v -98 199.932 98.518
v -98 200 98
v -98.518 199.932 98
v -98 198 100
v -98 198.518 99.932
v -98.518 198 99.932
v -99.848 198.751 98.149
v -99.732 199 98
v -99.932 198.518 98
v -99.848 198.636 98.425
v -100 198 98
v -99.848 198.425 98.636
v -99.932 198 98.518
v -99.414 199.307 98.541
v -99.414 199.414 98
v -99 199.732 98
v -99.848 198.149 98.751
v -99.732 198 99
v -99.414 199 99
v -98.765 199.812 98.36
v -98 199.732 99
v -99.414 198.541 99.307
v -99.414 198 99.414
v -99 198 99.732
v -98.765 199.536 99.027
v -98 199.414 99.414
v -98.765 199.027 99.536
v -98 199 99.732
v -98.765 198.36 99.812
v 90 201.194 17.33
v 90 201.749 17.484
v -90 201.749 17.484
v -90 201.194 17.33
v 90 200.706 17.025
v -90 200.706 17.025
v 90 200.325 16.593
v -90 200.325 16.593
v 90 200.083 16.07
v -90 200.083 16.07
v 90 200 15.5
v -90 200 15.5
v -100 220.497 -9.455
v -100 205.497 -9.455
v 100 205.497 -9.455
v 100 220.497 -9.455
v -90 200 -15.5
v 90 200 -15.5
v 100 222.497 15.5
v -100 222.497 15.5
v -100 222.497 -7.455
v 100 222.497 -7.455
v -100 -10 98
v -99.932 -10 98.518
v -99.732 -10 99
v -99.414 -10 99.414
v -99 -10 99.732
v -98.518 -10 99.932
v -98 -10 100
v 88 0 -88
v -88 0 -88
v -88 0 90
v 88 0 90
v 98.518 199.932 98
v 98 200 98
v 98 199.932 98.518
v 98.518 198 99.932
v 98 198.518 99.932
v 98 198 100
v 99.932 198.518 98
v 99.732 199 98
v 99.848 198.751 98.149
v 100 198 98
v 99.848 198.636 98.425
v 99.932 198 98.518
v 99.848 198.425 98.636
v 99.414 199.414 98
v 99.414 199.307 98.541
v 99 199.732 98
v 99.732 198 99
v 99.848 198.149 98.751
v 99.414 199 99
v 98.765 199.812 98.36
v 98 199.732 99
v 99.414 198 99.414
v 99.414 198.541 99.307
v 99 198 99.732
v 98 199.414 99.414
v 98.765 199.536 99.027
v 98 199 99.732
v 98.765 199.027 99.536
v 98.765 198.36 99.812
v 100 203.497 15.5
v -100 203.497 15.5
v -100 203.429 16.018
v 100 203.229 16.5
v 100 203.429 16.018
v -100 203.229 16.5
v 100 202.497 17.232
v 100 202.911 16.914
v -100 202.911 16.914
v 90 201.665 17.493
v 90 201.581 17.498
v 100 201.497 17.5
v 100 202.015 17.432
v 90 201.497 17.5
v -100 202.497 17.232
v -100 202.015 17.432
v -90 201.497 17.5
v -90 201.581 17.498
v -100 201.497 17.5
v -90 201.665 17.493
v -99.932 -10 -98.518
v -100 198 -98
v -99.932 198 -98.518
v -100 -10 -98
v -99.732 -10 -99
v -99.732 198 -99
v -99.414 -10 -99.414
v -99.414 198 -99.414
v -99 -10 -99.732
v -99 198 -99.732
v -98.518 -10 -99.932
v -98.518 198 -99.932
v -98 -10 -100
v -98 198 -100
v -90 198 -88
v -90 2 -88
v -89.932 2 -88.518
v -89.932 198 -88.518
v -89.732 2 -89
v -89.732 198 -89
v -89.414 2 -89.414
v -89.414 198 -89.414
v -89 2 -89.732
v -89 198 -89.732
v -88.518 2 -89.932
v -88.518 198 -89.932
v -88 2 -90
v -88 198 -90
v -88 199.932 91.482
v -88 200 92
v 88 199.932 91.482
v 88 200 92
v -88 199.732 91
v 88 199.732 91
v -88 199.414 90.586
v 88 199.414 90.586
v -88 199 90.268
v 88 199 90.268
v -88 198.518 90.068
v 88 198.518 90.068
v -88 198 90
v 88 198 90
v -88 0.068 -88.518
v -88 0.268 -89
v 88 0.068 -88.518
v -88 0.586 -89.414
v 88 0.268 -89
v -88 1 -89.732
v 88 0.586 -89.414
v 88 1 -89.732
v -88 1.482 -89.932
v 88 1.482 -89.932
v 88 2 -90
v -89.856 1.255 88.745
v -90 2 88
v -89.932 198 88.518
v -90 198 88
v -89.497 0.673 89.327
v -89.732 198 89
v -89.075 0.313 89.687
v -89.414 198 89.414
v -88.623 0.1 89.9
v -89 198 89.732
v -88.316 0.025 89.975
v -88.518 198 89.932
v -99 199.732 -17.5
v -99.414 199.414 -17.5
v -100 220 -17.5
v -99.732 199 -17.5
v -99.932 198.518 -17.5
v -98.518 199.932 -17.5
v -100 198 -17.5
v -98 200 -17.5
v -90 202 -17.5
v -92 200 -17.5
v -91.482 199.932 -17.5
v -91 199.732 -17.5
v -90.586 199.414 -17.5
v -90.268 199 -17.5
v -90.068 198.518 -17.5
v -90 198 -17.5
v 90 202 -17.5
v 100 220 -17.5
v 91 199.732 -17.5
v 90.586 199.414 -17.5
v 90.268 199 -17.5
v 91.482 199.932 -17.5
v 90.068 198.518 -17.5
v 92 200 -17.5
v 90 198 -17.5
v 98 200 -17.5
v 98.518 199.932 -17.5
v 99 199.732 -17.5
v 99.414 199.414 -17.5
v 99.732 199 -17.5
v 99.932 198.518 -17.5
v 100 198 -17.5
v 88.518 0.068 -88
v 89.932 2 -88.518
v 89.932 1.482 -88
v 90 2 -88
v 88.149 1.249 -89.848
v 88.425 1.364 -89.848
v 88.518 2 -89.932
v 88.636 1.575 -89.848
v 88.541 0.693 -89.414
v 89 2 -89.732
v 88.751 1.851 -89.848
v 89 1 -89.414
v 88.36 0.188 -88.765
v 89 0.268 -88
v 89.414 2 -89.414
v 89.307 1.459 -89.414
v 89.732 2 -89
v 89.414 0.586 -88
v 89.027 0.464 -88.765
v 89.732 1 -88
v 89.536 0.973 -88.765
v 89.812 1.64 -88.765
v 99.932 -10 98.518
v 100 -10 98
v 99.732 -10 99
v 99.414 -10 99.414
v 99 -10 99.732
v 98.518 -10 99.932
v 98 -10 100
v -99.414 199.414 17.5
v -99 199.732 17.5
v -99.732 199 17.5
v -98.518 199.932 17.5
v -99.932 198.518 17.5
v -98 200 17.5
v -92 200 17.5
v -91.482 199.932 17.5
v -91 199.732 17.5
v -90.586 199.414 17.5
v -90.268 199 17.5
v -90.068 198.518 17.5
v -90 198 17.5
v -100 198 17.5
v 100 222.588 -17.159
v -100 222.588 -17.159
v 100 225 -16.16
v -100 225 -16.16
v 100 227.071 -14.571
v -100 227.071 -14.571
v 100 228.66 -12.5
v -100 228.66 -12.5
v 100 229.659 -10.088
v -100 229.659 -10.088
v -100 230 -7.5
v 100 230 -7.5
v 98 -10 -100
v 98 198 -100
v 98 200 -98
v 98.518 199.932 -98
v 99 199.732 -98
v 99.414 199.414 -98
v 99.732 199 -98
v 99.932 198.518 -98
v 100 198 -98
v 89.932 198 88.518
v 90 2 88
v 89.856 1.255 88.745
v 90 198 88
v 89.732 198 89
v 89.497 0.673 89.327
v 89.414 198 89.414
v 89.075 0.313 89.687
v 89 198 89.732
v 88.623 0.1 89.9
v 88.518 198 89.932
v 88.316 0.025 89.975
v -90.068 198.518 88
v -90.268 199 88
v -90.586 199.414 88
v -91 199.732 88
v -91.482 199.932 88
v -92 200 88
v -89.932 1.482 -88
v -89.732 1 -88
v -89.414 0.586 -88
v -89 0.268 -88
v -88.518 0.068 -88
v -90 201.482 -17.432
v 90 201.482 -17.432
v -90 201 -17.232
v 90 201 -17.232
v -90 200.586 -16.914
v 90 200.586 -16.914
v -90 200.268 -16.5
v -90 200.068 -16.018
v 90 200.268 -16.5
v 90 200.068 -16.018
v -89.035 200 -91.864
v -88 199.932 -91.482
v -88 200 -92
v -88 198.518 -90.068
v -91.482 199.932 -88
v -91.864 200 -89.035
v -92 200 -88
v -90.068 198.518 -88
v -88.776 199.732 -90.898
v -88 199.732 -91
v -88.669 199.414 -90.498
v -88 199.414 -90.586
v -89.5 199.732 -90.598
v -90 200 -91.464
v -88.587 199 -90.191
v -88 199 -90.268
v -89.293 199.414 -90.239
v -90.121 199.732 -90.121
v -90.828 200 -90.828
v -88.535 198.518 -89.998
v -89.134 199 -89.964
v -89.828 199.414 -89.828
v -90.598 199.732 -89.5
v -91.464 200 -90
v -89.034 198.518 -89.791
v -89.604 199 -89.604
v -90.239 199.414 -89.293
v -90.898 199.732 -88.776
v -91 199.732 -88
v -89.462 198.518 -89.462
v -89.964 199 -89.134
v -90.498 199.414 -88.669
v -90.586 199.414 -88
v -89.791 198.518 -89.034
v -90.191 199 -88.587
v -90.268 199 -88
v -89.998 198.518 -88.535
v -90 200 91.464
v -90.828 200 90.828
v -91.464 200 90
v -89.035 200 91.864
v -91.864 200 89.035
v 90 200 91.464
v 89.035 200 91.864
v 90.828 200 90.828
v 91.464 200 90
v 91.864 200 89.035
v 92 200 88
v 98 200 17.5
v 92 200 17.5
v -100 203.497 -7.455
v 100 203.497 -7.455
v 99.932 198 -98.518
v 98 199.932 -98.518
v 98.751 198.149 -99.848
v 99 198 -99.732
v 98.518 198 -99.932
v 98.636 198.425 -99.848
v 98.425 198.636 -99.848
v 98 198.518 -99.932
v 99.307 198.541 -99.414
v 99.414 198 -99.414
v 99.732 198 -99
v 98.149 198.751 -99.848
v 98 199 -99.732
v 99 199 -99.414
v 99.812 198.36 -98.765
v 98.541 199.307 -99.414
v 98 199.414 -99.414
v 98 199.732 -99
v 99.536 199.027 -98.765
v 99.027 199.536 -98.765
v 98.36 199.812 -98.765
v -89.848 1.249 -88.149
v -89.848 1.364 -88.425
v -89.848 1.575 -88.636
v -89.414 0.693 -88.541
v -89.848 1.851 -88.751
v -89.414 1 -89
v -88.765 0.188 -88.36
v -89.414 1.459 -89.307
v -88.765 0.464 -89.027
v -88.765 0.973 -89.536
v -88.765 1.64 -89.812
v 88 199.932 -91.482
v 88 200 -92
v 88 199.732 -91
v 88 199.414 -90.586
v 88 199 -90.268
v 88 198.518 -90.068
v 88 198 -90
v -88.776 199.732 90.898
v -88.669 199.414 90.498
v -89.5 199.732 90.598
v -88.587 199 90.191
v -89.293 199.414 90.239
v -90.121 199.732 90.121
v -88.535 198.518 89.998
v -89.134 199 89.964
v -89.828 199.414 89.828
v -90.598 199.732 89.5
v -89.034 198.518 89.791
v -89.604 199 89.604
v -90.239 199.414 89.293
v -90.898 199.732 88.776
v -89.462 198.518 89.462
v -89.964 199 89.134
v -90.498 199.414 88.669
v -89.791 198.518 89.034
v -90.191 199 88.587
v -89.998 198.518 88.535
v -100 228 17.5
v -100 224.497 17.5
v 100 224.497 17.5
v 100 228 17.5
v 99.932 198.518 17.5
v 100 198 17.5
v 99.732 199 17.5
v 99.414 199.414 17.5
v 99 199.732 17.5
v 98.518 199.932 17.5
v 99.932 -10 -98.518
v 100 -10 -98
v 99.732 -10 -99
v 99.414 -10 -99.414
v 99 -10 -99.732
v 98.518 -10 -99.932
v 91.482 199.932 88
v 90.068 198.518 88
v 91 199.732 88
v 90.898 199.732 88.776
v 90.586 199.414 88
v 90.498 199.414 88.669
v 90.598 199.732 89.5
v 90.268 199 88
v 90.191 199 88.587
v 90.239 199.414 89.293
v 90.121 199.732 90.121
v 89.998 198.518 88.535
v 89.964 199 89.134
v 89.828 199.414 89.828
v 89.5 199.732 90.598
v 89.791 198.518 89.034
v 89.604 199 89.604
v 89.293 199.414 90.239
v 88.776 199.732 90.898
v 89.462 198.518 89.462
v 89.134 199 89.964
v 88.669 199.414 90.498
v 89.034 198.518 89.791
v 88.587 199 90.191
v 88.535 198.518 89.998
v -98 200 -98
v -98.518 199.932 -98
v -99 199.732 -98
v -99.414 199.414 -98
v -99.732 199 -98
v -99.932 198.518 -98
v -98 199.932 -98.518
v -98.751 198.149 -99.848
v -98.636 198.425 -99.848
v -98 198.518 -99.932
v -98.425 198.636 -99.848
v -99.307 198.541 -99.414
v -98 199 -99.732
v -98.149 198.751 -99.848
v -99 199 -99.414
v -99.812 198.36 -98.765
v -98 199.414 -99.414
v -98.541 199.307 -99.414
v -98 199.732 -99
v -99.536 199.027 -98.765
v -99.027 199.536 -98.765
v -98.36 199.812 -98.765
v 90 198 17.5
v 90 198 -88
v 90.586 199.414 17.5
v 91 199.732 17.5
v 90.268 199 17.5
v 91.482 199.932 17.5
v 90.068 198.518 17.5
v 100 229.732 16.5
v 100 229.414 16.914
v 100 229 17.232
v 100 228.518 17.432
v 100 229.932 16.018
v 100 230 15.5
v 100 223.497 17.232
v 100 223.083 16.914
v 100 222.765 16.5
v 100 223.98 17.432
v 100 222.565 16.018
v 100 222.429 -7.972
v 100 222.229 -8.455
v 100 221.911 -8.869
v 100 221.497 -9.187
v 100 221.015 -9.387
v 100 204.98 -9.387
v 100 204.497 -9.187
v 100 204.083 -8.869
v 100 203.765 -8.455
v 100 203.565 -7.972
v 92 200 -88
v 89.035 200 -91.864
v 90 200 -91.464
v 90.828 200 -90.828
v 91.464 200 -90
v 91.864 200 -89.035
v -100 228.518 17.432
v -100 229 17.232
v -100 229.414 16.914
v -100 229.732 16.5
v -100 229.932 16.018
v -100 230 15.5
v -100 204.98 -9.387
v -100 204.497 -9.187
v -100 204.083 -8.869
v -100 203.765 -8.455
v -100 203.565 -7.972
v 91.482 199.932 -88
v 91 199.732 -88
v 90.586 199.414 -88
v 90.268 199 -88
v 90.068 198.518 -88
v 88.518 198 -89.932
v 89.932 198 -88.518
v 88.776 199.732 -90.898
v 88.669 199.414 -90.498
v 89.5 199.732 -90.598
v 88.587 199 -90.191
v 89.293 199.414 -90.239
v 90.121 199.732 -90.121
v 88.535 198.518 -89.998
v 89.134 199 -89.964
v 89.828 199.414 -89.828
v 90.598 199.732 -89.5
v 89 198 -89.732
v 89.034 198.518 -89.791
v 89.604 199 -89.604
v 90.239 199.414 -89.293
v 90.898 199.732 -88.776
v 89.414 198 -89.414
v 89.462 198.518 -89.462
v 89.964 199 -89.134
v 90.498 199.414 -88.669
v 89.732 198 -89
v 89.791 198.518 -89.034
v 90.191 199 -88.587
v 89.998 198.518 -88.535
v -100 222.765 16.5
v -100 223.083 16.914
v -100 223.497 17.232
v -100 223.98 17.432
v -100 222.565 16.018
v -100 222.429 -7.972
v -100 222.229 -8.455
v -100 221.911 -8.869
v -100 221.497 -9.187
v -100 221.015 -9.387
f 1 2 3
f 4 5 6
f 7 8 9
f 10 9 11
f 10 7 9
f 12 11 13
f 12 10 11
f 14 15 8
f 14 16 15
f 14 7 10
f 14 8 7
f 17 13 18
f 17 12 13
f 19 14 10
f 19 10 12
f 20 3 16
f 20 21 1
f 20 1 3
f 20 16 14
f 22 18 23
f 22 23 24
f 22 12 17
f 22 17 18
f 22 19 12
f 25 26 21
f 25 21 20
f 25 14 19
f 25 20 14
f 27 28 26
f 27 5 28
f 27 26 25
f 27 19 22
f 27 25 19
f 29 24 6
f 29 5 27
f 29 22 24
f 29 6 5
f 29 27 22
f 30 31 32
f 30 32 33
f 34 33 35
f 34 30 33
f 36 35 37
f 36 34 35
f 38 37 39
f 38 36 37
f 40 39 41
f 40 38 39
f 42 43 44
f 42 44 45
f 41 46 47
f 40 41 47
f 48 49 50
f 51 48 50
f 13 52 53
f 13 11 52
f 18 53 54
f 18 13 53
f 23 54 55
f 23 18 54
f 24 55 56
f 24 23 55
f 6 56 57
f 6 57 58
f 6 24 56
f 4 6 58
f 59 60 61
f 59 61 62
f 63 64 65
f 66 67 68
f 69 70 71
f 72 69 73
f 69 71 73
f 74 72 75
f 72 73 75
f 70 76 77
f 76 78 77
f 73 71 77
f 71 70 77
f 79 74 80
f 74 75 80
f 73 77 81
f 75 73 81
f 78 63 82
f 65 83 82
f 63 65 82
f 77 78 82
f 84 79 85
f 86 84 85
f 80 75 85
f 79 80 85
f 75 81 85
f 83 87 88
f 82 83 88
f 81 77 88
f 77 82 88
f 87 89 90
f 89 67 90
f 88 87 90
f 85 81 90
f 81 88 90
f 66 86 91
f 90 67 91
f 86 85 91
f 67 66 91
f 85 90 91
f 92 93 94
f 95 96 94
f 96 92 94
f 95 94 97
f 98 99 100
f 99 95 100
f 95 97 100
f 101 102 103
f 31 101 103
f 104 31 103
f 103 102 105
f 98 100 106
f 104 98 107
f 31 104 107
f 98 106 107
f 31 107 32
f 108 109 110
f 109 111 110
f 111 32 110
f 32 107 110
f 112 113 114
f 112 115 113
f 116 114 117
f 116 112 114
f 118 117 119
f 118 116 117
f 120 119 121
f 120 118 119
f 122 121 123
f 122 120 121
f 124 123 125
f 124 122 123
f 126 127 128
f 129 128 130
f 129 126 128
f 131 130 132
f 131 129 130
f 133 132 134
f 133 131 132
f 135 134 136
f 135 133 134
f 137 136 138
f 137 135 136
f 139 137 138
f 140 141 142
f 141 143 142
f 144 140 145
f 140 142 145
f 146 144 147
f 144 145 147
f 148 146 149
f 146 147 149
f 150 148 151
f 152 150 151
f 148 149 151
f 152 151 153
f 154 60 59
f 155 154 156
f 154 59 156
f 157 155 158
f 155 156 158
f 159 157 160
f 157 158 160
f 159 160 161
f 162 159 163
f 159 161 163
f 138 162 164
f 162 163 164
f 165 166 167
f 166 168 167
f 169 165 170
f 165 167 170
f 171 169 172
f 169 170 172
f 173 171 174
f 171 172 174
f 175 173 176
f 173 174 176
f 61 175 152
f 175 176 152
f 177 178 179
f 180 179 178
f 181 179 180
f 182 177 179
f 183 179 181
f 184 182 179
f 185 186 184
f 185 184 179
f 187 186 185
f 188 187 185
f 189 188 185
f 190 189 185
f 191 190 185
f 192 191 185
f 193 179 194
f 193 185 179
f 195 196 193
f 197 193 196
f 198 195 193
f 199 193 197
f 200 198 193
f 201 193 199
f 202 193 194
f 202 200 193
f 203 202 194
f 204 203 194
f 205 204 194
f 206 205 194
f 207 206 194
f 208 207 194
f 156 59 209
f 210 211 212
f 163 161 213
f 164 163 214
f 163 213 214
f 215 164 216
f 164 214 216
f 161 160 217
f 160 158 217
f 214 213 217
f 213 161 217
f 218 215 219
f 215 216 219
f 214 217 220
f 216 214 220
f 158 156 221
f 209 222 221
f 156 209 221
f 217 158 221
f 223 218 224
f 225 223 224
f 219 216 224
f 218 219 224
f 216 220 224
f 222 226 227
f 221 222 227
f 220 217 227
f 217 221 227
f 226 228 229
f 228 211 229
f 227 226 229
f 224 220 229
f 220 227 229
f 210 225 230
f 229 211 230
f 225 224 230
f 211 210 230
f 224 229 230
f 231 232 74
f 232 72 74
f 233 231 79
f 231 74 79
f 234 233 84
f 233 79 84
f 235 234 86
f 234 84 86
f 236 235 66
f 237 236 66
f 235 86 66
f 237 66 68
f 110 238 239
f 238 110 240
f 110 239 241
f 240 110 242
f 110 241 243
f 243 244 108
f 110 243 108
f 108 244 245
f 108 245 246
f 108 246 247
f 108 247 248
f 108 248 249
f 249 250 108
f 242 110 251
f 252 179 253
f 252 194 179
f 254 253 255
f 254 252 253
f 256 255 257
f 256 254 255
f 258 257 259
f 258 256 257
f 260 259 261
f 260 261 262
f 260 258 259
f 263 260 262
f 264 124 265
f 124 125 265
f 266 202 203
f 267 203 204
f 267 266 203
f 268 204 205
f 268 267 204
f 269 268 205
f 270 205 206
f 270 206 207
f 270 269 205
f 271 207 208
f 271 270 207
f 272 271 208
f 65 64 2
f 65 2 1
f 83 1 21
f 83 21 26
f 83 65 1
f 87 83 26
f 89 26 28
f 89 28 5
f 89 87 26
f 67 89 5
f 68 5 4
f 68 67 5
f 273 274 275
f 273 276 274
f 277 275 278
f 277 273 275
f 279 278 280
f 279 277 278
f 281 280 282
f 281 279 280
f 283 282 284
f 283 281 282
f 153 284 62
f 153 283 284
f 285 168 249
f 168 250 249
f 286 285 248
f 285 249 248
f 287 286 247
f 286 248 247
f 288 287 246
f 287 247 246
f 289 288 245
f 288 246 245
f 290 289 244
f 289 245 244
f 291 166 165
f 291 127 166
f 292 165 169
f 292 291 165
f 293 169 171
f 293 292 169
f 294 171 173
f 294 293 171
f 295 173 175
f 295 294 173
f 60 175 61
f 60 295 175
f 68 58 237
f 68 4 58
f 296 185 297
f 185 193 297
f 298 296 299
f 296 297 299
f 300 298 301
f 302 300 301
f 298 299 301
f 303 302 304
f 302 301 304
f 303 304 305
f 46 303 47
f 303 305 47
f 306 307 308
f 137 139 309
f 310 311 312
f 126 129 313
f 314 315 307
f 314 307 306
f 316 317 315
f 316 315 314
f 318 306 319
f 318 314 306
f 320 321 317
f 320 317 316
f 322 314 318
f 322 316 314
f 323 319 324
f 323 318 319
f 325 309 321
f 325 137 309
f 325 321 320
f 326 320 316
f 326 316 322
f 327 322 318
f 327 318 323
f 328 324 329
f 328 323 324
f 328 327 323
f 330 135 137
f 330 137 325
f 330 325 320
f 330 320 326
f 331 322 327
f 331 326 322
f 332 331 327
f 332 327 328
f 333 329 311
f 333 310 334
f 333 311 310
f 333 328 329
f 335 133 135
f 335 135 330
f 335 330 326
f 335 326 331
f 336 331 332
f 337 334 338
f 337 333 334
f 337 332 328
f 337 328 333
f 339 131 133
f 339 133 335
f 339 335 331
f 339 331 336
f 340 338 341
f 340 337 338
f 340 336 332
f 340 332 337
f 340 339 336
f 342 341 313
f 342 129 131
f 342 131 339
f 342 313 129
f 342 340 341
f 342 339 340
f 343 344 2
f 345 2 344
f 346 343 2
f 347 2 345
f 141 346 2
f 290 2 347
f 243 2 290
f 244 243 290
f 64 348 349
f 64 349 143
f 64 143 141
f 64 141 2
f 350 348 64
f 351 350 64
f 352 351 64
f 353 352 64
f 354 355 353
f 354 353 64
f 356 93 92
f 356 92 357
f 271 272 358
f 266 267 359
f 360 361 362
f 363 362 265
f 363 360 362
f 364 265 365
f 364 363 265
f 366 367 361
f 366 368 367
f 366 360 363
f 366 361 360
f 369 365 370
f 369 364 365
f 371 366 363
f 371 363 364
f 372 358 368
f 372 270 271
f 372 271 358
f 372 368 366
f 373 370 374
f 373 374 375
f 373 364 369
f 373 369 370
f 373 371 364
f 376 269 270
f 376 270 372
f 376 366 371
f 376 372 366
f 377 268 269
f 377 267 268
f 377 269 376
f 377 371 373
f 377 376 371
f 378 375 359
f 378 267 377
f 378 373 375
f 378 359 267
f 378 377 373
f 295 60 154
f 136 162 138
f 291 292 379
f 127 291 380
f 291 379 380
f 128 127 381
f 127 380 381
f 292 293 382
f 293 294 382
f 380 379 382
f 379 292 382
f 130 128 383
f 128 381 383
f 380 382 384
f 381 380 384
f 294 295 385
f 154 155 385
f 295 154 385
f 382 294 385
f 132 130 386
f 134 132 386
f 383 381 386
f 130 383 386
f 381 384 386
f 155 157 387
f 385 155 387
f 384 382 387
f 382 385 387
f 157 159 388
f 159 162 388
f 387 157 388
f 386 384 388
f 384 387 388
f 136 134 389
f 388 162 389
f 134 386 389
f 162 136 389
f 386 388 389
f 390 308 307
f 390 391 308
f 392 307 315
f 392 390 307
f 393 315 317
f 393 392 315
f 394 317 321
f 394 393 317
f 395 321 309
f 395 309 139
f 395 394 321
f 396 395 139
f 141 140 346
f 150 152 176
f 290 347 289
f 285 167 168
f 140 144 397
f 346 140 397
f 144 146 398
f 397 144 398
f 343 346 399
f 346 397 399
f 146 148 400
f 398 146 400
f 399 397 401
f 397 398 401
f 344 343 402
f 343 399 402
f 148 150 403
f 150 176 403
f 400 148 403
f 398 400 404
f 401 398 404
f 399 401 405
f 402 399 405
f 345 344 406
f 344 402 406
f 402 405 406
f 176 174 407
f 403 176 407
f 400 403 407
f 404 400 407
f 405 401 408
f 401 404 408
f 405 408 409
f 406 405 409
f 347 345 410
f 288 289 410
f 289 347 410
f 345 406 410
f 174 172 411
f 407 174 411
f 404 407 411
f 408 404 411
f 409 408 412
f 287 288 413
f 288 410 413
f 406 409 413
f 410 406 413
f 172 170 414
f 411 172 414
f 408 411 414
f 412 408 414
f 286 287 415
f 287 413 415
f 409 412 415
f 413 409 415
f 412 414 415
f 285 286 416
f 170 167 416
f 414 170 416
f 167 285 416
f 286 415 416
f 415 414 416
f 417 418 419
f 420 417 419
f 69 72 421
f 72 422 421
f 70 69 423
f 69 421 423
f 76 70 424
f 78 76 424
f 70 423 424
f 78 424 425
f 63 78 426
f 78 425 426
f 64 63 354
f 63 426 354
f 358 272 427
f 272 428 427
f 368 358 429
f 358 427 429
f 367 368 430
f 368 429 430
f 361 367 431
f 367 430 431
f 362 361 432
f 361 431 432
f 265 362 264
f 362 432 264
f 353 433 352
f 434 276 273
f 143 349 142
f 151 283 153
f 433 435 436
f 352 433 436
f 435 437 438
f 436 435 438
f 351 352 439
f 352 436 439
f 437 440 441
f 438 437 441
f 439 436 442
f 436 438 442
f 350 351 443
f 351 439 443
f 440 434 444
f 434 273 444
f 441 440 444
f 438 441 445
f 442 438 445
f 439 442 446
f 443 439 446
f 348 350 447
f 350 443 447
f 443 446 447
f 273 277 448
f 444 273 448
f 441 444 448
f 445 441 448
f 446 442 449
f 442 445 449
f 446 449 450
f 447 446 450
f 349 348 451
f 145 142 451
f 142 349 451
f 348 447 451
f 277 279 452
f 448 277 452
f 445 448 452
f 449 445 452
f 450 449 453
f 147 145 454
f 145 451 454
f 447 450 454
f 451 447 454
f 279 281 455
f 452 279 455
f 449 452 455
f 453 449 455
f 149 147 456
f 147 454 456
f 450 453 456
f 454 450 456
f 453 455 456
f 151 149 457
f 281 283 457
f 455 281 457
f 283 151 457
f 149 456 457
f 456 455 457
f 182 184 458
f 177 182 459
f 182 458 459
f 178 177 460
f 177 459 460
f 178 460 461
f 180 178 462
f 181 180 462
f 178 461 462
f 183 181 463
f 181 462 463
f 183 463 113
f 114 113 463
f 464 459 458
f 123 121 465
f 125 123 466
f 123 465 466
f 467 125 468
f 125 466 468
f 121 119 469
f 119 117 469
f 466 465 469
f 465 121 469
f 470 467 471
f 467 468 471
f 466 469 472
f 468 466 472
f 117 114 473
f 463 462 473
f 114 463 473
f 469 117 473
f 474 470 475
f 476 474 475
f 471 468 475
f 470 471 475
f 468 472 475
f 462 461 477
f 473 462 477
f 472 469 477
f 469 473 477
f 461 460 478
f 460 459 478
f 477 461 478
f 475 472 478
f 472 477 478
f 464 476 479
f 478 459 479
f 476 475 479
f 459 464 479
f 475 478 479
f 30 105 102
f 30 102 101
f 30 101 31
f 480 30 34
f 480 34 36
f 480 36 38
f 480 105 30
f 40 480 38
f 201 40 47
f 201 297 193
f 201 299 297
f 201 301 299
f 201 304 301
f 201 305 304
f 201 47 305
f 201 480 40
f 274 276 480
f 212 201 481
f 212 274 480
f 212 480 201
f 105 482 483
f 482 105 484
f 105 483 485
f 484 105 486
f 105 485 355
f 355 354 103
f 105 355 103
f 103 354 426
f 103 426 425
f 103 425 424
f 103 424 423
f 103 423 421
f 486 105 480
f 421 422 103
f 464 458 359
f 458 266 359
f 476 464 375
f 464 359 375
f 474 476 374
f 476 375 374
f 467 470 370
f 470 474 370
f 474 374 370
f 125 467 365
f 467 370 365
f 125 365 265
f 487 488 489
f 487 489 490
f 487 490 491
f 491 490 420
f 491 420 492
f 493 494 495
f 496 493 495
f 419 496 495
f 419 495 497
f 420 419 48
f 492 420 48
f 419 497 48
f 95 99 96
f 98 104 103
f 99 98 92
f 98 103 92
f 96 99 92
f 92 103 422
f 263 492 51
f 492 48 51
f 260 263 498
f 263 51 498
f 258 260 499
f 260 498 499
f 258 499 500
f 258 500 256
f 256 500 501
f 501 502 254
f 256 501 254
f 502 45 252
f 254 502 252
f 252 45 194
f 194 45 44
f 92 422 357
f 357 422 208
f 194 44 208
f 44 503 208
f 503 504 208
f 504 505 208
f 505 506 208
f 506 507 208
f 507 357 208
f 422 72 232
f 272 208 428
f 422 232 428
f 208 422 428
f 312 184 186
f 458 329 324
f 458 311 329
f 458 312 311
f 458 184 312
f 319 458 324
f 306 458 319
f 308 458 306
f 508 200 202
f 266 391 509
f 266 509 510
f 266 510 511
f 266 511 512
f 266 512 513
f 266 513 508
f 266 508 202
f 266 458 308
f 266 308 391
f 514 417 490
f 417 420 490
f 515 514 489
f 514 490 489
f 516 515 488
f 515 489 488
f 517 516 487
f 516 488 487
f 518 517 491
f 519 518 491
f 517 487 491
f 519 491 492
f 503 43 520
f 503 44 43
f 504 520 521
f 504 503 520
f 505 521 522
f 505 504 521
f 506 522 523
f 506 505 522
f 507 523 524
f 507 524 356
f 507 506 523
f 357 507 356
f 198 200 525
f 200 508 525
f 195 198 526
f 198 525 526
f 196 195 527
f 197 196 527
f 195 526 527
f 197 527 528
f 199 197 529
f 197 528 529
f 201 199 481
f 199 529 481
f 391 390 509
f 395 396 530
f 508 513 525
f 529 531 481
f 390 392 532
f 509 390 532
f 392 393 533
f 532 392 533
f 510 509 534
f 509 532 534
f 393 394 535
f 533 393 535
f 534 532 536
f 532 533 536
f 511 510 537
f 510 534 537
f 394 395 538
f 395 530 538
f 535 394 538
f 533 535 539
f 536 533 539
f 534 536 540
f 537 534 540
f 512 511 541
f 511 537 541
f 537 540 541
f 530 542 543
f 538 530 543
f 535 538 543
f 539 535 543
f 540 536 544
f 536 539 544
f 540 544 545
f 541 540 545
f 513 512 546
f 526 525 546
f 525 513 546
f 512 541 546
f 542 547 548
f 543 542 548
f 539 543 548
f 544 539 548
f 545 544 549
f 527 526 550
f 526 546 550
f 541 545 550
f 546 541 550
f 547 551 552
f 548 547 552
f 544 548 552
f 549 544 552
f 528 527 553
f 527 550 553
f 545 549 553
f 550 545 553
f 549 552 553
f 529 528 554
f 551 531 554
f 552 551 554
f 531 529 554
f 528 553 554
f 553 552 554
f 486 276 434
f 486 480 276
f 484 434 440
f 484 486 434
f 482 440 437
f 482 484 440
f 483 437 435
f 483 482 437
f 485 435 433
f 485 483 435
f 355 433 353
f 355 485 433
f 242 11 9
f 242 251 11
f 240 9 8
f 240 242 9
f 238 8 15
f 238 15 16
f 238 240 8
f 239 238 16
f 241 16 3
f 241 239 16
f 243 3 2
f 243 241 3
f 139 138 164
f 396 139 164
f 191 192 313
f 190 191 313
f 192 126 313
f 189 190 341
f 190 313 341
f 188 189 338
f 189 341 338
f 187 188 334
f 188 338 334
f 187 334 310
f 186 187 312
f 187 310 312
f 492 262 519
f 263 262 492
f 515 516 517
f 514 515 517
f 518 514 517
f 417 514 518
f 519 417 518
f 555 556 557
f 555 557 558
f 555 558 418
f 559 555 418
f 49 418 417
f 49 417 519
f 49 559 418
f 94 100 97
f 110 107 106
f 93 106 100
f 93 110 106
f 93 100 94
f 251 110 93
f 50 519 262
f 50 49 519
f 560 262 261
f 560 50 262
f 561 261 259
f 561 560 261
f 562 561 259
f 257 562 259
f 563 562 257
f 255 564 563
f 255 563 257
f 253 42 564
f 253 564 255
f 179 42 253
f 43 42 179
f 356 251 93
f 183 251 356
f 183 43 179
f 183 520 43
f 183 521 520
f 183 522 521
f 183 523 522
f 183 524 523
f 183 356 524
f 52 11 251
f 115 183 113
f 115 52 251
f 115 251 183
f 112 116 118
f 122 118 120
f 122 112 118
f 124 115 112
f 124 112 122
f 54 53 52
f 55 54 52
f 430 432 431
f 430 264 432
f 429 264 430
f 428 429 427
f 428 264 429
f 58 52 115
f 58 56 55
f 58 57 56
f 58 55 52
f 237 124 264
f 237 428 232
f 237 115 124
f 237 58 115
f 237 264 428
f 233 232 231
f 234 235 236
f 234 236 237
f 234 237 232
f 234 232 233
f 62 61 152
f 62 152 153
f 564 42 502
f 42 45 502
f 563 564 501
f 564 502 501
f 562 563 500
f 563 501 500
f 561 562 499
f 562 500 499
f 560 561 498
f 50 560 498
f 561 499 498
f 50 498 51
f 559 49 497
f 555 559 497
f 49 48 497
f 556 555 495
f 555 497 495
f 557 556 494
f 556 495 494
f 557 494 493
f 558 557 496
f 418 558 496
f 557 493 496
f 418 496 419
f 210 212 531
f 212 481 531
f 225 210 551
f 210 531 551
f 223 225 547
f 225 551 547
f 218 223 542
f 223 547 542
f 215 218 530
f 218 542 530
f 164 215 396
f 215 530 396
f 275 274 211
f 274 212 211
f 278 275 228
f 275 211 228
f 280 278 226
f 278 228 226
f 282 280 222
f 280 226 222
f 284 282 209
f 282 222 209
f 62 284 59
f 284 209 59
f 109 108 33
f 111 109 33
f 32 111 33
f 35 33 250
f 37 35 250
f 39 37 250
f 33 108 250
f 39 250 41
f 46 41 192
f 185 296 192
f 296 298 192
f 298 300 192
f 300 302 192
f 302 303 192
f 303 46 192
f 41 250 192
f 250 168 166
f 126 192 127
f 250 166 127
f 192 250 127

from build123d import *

# Parameters (mm, degrees)
SKETCH1_W               = 200
SKETCH1_H               = 200
SKETCH1_W_2             = 180
SKETCH1_H_2             = 180
BOSS_EXTRUDE1_DEPTH     = 200
SKETCH2_W               = 200
SKETCH2_H               = 200
BOSS_EXTRUDE2_DEPTH     = 10
SKETCH3_W               = 200
SKETCH3_H               = 35
BOSS_EXTRUDE3_DEPTH     = 30
CUT_EXTRUDE1_DEPTH      = 321.780298647
CUT_EXTRUDE1_DEPTH_BACK = 321.780298647
SKETCH4_W               = 26.954773083
SKETCH4_H               = 19
FILLET1_R               = 10
FILLET3_R               = 2
FILLET4_R               = 2
FILLET6_R               = 2
FILLET7_R               = 2
FILLET8_R               = 2
FILLET9_R               = 2


with BuildPart() as part:
    # Sketch1 → Boss-Extrude1 (new body)
    with BuildSketch(Plane(origin=(0, 0, 0), x_dir=(1, 0, 0), z_dir=(0, 1, 0))):
        Rectangle(SKETCH1_W, SKETCH1_H)
        Rectangle(SKETCH1_W_2, SKETCH1_H_2, mode=Mode.SUBTRACT)
    extrude(amount=BOSS_EXTRUDE1_DEPTH)

    # Sketch2 → Boss-Extrude2 (add)
    with BuildSketch(Plane.XZ):
        Rectangle(SKETCH2_W, SKETCH2_H)
    extrude(amount=BOSS_EXTRUDE2_DEPTH)

    # Sketch3 → Boss-Extrude3 (add)
    with BuildSketch(Plane(origin=(0, 200, 0), x_dir=(1, 0, 0), z_dir=(0, 1, 0))):
        Rectangle(SKETCH3_W, SKETCH3_H)
    extrude(amount=BOSS_EXTRUDE3_DEPTH)

    # Sketch4 → Cut-Extrude1 (cut, two sides: drawn at the far end of the back side and taken through both)
    with BuildSketch(Plane(origin=(100, 0, 0), x_dir=(0, 0, -1), z_dir=(1, 0, 0)).offset(-CUT_EXTRUDE1_DEPTH_BACK)):
        with Locations((-4.022613458, 212.997200487)):
            Rectangle(SKETCH4_W, SKETCH4_H)
    extrude(amount=CUT_EXTRUDE1_DEPTH + CUT_EXTRUDE1_DEPTH_BACK, mode=Mode.SUBTRACT)

    # Fillet1
    fillet1_edges = [part.edges().sort_by_distance(p)[0] for p in [
        (0, 230, -17.5),
    ]]
    fillet(fillet1_edges, radius=FILLET1_R)

    # Fillet3
    fillet3_edges = [part.edges().sort_by_distance(p)[0] for p in [
        (0, 200, -17.5),
    ]]
    fillet(fillet3_edges, radius=FILLET3_R)

    # Fillet4
    fillet4_edges = [part.edges().sort_by_distance(p)[0] for p in [
        (-100, 200, -58.75),
        (90, 0, 0),
        (90, 100, 90),
        (0, 0, -90),
        (90, 100, -90),
        (-90, 0, 0),
        (-90, 100, -90),
        (-90, 100, 90),
        (90, 200, 53.75),
        (0, 200, 100),
        (0, 200, -90),
        (-90, 200, -53.75),
        (0, 200, 90),
        (100, 200, -58.75),
        (-100, 200, 58.75),
        (90, 200, -53.75),
        (-90, 200, 53.75),
        (100, 200, 58.75),
        (100, 95, 100),
        (-100, 95, 100),
        (-100, 95, -100),
        (100, 95, -100),
        (0, 200, -100),
    ]]
    fillet(fillet4_edges, radius=FILLET4_R)

    # Fillet6
    fillet6_edges = [part.edges().sort_by_distance(p)[0] for p in [
        (0, 200, 17.5),
    ]]
    fillet(fillet6_edges, radius=FILLET6_R)

    # Fillet7
    fillet7_edges = [part.edges().sort_by_distance(p)[0] for p in [
        (0, 203.497200487, -9.454773083),
    ]]
    fillet(fillet7_edges, radius=FILLET7_R)

    # Fillet8
    fillet8_edges = [part.edges().sort_by_distance(p)[0] for p in [
        (0, 230, 17.5),
        (0, 222.497200487, -9.454773083),
        (0, 222.497200487, 17.5),
    ]]
    fillet(fillet8_edges, radius=FILLET8_R)

    # Fillet9
    # the kernel refuses this fillet: 2 mm, written as the material it takes off along each edge
    with BuildSketch(Plane(origin=(-105, 203.497200487, 17.5), x_dir=(0, 0, -1), z_dir=(1, 0, 0))) as fillet9_piece_1:
        with BuildLine():
            CenterArc((FILLET9_R, -FILLET9_R), FILLET9_R, 90, 90)
            Line((0, -FILLET9_R), (0, 0))
            Line((0, 0), (FILLET9_R, 0))
        make_face()
    extrude(amount=210, mode=Mode.SUBTRACT)


solid = part.part
